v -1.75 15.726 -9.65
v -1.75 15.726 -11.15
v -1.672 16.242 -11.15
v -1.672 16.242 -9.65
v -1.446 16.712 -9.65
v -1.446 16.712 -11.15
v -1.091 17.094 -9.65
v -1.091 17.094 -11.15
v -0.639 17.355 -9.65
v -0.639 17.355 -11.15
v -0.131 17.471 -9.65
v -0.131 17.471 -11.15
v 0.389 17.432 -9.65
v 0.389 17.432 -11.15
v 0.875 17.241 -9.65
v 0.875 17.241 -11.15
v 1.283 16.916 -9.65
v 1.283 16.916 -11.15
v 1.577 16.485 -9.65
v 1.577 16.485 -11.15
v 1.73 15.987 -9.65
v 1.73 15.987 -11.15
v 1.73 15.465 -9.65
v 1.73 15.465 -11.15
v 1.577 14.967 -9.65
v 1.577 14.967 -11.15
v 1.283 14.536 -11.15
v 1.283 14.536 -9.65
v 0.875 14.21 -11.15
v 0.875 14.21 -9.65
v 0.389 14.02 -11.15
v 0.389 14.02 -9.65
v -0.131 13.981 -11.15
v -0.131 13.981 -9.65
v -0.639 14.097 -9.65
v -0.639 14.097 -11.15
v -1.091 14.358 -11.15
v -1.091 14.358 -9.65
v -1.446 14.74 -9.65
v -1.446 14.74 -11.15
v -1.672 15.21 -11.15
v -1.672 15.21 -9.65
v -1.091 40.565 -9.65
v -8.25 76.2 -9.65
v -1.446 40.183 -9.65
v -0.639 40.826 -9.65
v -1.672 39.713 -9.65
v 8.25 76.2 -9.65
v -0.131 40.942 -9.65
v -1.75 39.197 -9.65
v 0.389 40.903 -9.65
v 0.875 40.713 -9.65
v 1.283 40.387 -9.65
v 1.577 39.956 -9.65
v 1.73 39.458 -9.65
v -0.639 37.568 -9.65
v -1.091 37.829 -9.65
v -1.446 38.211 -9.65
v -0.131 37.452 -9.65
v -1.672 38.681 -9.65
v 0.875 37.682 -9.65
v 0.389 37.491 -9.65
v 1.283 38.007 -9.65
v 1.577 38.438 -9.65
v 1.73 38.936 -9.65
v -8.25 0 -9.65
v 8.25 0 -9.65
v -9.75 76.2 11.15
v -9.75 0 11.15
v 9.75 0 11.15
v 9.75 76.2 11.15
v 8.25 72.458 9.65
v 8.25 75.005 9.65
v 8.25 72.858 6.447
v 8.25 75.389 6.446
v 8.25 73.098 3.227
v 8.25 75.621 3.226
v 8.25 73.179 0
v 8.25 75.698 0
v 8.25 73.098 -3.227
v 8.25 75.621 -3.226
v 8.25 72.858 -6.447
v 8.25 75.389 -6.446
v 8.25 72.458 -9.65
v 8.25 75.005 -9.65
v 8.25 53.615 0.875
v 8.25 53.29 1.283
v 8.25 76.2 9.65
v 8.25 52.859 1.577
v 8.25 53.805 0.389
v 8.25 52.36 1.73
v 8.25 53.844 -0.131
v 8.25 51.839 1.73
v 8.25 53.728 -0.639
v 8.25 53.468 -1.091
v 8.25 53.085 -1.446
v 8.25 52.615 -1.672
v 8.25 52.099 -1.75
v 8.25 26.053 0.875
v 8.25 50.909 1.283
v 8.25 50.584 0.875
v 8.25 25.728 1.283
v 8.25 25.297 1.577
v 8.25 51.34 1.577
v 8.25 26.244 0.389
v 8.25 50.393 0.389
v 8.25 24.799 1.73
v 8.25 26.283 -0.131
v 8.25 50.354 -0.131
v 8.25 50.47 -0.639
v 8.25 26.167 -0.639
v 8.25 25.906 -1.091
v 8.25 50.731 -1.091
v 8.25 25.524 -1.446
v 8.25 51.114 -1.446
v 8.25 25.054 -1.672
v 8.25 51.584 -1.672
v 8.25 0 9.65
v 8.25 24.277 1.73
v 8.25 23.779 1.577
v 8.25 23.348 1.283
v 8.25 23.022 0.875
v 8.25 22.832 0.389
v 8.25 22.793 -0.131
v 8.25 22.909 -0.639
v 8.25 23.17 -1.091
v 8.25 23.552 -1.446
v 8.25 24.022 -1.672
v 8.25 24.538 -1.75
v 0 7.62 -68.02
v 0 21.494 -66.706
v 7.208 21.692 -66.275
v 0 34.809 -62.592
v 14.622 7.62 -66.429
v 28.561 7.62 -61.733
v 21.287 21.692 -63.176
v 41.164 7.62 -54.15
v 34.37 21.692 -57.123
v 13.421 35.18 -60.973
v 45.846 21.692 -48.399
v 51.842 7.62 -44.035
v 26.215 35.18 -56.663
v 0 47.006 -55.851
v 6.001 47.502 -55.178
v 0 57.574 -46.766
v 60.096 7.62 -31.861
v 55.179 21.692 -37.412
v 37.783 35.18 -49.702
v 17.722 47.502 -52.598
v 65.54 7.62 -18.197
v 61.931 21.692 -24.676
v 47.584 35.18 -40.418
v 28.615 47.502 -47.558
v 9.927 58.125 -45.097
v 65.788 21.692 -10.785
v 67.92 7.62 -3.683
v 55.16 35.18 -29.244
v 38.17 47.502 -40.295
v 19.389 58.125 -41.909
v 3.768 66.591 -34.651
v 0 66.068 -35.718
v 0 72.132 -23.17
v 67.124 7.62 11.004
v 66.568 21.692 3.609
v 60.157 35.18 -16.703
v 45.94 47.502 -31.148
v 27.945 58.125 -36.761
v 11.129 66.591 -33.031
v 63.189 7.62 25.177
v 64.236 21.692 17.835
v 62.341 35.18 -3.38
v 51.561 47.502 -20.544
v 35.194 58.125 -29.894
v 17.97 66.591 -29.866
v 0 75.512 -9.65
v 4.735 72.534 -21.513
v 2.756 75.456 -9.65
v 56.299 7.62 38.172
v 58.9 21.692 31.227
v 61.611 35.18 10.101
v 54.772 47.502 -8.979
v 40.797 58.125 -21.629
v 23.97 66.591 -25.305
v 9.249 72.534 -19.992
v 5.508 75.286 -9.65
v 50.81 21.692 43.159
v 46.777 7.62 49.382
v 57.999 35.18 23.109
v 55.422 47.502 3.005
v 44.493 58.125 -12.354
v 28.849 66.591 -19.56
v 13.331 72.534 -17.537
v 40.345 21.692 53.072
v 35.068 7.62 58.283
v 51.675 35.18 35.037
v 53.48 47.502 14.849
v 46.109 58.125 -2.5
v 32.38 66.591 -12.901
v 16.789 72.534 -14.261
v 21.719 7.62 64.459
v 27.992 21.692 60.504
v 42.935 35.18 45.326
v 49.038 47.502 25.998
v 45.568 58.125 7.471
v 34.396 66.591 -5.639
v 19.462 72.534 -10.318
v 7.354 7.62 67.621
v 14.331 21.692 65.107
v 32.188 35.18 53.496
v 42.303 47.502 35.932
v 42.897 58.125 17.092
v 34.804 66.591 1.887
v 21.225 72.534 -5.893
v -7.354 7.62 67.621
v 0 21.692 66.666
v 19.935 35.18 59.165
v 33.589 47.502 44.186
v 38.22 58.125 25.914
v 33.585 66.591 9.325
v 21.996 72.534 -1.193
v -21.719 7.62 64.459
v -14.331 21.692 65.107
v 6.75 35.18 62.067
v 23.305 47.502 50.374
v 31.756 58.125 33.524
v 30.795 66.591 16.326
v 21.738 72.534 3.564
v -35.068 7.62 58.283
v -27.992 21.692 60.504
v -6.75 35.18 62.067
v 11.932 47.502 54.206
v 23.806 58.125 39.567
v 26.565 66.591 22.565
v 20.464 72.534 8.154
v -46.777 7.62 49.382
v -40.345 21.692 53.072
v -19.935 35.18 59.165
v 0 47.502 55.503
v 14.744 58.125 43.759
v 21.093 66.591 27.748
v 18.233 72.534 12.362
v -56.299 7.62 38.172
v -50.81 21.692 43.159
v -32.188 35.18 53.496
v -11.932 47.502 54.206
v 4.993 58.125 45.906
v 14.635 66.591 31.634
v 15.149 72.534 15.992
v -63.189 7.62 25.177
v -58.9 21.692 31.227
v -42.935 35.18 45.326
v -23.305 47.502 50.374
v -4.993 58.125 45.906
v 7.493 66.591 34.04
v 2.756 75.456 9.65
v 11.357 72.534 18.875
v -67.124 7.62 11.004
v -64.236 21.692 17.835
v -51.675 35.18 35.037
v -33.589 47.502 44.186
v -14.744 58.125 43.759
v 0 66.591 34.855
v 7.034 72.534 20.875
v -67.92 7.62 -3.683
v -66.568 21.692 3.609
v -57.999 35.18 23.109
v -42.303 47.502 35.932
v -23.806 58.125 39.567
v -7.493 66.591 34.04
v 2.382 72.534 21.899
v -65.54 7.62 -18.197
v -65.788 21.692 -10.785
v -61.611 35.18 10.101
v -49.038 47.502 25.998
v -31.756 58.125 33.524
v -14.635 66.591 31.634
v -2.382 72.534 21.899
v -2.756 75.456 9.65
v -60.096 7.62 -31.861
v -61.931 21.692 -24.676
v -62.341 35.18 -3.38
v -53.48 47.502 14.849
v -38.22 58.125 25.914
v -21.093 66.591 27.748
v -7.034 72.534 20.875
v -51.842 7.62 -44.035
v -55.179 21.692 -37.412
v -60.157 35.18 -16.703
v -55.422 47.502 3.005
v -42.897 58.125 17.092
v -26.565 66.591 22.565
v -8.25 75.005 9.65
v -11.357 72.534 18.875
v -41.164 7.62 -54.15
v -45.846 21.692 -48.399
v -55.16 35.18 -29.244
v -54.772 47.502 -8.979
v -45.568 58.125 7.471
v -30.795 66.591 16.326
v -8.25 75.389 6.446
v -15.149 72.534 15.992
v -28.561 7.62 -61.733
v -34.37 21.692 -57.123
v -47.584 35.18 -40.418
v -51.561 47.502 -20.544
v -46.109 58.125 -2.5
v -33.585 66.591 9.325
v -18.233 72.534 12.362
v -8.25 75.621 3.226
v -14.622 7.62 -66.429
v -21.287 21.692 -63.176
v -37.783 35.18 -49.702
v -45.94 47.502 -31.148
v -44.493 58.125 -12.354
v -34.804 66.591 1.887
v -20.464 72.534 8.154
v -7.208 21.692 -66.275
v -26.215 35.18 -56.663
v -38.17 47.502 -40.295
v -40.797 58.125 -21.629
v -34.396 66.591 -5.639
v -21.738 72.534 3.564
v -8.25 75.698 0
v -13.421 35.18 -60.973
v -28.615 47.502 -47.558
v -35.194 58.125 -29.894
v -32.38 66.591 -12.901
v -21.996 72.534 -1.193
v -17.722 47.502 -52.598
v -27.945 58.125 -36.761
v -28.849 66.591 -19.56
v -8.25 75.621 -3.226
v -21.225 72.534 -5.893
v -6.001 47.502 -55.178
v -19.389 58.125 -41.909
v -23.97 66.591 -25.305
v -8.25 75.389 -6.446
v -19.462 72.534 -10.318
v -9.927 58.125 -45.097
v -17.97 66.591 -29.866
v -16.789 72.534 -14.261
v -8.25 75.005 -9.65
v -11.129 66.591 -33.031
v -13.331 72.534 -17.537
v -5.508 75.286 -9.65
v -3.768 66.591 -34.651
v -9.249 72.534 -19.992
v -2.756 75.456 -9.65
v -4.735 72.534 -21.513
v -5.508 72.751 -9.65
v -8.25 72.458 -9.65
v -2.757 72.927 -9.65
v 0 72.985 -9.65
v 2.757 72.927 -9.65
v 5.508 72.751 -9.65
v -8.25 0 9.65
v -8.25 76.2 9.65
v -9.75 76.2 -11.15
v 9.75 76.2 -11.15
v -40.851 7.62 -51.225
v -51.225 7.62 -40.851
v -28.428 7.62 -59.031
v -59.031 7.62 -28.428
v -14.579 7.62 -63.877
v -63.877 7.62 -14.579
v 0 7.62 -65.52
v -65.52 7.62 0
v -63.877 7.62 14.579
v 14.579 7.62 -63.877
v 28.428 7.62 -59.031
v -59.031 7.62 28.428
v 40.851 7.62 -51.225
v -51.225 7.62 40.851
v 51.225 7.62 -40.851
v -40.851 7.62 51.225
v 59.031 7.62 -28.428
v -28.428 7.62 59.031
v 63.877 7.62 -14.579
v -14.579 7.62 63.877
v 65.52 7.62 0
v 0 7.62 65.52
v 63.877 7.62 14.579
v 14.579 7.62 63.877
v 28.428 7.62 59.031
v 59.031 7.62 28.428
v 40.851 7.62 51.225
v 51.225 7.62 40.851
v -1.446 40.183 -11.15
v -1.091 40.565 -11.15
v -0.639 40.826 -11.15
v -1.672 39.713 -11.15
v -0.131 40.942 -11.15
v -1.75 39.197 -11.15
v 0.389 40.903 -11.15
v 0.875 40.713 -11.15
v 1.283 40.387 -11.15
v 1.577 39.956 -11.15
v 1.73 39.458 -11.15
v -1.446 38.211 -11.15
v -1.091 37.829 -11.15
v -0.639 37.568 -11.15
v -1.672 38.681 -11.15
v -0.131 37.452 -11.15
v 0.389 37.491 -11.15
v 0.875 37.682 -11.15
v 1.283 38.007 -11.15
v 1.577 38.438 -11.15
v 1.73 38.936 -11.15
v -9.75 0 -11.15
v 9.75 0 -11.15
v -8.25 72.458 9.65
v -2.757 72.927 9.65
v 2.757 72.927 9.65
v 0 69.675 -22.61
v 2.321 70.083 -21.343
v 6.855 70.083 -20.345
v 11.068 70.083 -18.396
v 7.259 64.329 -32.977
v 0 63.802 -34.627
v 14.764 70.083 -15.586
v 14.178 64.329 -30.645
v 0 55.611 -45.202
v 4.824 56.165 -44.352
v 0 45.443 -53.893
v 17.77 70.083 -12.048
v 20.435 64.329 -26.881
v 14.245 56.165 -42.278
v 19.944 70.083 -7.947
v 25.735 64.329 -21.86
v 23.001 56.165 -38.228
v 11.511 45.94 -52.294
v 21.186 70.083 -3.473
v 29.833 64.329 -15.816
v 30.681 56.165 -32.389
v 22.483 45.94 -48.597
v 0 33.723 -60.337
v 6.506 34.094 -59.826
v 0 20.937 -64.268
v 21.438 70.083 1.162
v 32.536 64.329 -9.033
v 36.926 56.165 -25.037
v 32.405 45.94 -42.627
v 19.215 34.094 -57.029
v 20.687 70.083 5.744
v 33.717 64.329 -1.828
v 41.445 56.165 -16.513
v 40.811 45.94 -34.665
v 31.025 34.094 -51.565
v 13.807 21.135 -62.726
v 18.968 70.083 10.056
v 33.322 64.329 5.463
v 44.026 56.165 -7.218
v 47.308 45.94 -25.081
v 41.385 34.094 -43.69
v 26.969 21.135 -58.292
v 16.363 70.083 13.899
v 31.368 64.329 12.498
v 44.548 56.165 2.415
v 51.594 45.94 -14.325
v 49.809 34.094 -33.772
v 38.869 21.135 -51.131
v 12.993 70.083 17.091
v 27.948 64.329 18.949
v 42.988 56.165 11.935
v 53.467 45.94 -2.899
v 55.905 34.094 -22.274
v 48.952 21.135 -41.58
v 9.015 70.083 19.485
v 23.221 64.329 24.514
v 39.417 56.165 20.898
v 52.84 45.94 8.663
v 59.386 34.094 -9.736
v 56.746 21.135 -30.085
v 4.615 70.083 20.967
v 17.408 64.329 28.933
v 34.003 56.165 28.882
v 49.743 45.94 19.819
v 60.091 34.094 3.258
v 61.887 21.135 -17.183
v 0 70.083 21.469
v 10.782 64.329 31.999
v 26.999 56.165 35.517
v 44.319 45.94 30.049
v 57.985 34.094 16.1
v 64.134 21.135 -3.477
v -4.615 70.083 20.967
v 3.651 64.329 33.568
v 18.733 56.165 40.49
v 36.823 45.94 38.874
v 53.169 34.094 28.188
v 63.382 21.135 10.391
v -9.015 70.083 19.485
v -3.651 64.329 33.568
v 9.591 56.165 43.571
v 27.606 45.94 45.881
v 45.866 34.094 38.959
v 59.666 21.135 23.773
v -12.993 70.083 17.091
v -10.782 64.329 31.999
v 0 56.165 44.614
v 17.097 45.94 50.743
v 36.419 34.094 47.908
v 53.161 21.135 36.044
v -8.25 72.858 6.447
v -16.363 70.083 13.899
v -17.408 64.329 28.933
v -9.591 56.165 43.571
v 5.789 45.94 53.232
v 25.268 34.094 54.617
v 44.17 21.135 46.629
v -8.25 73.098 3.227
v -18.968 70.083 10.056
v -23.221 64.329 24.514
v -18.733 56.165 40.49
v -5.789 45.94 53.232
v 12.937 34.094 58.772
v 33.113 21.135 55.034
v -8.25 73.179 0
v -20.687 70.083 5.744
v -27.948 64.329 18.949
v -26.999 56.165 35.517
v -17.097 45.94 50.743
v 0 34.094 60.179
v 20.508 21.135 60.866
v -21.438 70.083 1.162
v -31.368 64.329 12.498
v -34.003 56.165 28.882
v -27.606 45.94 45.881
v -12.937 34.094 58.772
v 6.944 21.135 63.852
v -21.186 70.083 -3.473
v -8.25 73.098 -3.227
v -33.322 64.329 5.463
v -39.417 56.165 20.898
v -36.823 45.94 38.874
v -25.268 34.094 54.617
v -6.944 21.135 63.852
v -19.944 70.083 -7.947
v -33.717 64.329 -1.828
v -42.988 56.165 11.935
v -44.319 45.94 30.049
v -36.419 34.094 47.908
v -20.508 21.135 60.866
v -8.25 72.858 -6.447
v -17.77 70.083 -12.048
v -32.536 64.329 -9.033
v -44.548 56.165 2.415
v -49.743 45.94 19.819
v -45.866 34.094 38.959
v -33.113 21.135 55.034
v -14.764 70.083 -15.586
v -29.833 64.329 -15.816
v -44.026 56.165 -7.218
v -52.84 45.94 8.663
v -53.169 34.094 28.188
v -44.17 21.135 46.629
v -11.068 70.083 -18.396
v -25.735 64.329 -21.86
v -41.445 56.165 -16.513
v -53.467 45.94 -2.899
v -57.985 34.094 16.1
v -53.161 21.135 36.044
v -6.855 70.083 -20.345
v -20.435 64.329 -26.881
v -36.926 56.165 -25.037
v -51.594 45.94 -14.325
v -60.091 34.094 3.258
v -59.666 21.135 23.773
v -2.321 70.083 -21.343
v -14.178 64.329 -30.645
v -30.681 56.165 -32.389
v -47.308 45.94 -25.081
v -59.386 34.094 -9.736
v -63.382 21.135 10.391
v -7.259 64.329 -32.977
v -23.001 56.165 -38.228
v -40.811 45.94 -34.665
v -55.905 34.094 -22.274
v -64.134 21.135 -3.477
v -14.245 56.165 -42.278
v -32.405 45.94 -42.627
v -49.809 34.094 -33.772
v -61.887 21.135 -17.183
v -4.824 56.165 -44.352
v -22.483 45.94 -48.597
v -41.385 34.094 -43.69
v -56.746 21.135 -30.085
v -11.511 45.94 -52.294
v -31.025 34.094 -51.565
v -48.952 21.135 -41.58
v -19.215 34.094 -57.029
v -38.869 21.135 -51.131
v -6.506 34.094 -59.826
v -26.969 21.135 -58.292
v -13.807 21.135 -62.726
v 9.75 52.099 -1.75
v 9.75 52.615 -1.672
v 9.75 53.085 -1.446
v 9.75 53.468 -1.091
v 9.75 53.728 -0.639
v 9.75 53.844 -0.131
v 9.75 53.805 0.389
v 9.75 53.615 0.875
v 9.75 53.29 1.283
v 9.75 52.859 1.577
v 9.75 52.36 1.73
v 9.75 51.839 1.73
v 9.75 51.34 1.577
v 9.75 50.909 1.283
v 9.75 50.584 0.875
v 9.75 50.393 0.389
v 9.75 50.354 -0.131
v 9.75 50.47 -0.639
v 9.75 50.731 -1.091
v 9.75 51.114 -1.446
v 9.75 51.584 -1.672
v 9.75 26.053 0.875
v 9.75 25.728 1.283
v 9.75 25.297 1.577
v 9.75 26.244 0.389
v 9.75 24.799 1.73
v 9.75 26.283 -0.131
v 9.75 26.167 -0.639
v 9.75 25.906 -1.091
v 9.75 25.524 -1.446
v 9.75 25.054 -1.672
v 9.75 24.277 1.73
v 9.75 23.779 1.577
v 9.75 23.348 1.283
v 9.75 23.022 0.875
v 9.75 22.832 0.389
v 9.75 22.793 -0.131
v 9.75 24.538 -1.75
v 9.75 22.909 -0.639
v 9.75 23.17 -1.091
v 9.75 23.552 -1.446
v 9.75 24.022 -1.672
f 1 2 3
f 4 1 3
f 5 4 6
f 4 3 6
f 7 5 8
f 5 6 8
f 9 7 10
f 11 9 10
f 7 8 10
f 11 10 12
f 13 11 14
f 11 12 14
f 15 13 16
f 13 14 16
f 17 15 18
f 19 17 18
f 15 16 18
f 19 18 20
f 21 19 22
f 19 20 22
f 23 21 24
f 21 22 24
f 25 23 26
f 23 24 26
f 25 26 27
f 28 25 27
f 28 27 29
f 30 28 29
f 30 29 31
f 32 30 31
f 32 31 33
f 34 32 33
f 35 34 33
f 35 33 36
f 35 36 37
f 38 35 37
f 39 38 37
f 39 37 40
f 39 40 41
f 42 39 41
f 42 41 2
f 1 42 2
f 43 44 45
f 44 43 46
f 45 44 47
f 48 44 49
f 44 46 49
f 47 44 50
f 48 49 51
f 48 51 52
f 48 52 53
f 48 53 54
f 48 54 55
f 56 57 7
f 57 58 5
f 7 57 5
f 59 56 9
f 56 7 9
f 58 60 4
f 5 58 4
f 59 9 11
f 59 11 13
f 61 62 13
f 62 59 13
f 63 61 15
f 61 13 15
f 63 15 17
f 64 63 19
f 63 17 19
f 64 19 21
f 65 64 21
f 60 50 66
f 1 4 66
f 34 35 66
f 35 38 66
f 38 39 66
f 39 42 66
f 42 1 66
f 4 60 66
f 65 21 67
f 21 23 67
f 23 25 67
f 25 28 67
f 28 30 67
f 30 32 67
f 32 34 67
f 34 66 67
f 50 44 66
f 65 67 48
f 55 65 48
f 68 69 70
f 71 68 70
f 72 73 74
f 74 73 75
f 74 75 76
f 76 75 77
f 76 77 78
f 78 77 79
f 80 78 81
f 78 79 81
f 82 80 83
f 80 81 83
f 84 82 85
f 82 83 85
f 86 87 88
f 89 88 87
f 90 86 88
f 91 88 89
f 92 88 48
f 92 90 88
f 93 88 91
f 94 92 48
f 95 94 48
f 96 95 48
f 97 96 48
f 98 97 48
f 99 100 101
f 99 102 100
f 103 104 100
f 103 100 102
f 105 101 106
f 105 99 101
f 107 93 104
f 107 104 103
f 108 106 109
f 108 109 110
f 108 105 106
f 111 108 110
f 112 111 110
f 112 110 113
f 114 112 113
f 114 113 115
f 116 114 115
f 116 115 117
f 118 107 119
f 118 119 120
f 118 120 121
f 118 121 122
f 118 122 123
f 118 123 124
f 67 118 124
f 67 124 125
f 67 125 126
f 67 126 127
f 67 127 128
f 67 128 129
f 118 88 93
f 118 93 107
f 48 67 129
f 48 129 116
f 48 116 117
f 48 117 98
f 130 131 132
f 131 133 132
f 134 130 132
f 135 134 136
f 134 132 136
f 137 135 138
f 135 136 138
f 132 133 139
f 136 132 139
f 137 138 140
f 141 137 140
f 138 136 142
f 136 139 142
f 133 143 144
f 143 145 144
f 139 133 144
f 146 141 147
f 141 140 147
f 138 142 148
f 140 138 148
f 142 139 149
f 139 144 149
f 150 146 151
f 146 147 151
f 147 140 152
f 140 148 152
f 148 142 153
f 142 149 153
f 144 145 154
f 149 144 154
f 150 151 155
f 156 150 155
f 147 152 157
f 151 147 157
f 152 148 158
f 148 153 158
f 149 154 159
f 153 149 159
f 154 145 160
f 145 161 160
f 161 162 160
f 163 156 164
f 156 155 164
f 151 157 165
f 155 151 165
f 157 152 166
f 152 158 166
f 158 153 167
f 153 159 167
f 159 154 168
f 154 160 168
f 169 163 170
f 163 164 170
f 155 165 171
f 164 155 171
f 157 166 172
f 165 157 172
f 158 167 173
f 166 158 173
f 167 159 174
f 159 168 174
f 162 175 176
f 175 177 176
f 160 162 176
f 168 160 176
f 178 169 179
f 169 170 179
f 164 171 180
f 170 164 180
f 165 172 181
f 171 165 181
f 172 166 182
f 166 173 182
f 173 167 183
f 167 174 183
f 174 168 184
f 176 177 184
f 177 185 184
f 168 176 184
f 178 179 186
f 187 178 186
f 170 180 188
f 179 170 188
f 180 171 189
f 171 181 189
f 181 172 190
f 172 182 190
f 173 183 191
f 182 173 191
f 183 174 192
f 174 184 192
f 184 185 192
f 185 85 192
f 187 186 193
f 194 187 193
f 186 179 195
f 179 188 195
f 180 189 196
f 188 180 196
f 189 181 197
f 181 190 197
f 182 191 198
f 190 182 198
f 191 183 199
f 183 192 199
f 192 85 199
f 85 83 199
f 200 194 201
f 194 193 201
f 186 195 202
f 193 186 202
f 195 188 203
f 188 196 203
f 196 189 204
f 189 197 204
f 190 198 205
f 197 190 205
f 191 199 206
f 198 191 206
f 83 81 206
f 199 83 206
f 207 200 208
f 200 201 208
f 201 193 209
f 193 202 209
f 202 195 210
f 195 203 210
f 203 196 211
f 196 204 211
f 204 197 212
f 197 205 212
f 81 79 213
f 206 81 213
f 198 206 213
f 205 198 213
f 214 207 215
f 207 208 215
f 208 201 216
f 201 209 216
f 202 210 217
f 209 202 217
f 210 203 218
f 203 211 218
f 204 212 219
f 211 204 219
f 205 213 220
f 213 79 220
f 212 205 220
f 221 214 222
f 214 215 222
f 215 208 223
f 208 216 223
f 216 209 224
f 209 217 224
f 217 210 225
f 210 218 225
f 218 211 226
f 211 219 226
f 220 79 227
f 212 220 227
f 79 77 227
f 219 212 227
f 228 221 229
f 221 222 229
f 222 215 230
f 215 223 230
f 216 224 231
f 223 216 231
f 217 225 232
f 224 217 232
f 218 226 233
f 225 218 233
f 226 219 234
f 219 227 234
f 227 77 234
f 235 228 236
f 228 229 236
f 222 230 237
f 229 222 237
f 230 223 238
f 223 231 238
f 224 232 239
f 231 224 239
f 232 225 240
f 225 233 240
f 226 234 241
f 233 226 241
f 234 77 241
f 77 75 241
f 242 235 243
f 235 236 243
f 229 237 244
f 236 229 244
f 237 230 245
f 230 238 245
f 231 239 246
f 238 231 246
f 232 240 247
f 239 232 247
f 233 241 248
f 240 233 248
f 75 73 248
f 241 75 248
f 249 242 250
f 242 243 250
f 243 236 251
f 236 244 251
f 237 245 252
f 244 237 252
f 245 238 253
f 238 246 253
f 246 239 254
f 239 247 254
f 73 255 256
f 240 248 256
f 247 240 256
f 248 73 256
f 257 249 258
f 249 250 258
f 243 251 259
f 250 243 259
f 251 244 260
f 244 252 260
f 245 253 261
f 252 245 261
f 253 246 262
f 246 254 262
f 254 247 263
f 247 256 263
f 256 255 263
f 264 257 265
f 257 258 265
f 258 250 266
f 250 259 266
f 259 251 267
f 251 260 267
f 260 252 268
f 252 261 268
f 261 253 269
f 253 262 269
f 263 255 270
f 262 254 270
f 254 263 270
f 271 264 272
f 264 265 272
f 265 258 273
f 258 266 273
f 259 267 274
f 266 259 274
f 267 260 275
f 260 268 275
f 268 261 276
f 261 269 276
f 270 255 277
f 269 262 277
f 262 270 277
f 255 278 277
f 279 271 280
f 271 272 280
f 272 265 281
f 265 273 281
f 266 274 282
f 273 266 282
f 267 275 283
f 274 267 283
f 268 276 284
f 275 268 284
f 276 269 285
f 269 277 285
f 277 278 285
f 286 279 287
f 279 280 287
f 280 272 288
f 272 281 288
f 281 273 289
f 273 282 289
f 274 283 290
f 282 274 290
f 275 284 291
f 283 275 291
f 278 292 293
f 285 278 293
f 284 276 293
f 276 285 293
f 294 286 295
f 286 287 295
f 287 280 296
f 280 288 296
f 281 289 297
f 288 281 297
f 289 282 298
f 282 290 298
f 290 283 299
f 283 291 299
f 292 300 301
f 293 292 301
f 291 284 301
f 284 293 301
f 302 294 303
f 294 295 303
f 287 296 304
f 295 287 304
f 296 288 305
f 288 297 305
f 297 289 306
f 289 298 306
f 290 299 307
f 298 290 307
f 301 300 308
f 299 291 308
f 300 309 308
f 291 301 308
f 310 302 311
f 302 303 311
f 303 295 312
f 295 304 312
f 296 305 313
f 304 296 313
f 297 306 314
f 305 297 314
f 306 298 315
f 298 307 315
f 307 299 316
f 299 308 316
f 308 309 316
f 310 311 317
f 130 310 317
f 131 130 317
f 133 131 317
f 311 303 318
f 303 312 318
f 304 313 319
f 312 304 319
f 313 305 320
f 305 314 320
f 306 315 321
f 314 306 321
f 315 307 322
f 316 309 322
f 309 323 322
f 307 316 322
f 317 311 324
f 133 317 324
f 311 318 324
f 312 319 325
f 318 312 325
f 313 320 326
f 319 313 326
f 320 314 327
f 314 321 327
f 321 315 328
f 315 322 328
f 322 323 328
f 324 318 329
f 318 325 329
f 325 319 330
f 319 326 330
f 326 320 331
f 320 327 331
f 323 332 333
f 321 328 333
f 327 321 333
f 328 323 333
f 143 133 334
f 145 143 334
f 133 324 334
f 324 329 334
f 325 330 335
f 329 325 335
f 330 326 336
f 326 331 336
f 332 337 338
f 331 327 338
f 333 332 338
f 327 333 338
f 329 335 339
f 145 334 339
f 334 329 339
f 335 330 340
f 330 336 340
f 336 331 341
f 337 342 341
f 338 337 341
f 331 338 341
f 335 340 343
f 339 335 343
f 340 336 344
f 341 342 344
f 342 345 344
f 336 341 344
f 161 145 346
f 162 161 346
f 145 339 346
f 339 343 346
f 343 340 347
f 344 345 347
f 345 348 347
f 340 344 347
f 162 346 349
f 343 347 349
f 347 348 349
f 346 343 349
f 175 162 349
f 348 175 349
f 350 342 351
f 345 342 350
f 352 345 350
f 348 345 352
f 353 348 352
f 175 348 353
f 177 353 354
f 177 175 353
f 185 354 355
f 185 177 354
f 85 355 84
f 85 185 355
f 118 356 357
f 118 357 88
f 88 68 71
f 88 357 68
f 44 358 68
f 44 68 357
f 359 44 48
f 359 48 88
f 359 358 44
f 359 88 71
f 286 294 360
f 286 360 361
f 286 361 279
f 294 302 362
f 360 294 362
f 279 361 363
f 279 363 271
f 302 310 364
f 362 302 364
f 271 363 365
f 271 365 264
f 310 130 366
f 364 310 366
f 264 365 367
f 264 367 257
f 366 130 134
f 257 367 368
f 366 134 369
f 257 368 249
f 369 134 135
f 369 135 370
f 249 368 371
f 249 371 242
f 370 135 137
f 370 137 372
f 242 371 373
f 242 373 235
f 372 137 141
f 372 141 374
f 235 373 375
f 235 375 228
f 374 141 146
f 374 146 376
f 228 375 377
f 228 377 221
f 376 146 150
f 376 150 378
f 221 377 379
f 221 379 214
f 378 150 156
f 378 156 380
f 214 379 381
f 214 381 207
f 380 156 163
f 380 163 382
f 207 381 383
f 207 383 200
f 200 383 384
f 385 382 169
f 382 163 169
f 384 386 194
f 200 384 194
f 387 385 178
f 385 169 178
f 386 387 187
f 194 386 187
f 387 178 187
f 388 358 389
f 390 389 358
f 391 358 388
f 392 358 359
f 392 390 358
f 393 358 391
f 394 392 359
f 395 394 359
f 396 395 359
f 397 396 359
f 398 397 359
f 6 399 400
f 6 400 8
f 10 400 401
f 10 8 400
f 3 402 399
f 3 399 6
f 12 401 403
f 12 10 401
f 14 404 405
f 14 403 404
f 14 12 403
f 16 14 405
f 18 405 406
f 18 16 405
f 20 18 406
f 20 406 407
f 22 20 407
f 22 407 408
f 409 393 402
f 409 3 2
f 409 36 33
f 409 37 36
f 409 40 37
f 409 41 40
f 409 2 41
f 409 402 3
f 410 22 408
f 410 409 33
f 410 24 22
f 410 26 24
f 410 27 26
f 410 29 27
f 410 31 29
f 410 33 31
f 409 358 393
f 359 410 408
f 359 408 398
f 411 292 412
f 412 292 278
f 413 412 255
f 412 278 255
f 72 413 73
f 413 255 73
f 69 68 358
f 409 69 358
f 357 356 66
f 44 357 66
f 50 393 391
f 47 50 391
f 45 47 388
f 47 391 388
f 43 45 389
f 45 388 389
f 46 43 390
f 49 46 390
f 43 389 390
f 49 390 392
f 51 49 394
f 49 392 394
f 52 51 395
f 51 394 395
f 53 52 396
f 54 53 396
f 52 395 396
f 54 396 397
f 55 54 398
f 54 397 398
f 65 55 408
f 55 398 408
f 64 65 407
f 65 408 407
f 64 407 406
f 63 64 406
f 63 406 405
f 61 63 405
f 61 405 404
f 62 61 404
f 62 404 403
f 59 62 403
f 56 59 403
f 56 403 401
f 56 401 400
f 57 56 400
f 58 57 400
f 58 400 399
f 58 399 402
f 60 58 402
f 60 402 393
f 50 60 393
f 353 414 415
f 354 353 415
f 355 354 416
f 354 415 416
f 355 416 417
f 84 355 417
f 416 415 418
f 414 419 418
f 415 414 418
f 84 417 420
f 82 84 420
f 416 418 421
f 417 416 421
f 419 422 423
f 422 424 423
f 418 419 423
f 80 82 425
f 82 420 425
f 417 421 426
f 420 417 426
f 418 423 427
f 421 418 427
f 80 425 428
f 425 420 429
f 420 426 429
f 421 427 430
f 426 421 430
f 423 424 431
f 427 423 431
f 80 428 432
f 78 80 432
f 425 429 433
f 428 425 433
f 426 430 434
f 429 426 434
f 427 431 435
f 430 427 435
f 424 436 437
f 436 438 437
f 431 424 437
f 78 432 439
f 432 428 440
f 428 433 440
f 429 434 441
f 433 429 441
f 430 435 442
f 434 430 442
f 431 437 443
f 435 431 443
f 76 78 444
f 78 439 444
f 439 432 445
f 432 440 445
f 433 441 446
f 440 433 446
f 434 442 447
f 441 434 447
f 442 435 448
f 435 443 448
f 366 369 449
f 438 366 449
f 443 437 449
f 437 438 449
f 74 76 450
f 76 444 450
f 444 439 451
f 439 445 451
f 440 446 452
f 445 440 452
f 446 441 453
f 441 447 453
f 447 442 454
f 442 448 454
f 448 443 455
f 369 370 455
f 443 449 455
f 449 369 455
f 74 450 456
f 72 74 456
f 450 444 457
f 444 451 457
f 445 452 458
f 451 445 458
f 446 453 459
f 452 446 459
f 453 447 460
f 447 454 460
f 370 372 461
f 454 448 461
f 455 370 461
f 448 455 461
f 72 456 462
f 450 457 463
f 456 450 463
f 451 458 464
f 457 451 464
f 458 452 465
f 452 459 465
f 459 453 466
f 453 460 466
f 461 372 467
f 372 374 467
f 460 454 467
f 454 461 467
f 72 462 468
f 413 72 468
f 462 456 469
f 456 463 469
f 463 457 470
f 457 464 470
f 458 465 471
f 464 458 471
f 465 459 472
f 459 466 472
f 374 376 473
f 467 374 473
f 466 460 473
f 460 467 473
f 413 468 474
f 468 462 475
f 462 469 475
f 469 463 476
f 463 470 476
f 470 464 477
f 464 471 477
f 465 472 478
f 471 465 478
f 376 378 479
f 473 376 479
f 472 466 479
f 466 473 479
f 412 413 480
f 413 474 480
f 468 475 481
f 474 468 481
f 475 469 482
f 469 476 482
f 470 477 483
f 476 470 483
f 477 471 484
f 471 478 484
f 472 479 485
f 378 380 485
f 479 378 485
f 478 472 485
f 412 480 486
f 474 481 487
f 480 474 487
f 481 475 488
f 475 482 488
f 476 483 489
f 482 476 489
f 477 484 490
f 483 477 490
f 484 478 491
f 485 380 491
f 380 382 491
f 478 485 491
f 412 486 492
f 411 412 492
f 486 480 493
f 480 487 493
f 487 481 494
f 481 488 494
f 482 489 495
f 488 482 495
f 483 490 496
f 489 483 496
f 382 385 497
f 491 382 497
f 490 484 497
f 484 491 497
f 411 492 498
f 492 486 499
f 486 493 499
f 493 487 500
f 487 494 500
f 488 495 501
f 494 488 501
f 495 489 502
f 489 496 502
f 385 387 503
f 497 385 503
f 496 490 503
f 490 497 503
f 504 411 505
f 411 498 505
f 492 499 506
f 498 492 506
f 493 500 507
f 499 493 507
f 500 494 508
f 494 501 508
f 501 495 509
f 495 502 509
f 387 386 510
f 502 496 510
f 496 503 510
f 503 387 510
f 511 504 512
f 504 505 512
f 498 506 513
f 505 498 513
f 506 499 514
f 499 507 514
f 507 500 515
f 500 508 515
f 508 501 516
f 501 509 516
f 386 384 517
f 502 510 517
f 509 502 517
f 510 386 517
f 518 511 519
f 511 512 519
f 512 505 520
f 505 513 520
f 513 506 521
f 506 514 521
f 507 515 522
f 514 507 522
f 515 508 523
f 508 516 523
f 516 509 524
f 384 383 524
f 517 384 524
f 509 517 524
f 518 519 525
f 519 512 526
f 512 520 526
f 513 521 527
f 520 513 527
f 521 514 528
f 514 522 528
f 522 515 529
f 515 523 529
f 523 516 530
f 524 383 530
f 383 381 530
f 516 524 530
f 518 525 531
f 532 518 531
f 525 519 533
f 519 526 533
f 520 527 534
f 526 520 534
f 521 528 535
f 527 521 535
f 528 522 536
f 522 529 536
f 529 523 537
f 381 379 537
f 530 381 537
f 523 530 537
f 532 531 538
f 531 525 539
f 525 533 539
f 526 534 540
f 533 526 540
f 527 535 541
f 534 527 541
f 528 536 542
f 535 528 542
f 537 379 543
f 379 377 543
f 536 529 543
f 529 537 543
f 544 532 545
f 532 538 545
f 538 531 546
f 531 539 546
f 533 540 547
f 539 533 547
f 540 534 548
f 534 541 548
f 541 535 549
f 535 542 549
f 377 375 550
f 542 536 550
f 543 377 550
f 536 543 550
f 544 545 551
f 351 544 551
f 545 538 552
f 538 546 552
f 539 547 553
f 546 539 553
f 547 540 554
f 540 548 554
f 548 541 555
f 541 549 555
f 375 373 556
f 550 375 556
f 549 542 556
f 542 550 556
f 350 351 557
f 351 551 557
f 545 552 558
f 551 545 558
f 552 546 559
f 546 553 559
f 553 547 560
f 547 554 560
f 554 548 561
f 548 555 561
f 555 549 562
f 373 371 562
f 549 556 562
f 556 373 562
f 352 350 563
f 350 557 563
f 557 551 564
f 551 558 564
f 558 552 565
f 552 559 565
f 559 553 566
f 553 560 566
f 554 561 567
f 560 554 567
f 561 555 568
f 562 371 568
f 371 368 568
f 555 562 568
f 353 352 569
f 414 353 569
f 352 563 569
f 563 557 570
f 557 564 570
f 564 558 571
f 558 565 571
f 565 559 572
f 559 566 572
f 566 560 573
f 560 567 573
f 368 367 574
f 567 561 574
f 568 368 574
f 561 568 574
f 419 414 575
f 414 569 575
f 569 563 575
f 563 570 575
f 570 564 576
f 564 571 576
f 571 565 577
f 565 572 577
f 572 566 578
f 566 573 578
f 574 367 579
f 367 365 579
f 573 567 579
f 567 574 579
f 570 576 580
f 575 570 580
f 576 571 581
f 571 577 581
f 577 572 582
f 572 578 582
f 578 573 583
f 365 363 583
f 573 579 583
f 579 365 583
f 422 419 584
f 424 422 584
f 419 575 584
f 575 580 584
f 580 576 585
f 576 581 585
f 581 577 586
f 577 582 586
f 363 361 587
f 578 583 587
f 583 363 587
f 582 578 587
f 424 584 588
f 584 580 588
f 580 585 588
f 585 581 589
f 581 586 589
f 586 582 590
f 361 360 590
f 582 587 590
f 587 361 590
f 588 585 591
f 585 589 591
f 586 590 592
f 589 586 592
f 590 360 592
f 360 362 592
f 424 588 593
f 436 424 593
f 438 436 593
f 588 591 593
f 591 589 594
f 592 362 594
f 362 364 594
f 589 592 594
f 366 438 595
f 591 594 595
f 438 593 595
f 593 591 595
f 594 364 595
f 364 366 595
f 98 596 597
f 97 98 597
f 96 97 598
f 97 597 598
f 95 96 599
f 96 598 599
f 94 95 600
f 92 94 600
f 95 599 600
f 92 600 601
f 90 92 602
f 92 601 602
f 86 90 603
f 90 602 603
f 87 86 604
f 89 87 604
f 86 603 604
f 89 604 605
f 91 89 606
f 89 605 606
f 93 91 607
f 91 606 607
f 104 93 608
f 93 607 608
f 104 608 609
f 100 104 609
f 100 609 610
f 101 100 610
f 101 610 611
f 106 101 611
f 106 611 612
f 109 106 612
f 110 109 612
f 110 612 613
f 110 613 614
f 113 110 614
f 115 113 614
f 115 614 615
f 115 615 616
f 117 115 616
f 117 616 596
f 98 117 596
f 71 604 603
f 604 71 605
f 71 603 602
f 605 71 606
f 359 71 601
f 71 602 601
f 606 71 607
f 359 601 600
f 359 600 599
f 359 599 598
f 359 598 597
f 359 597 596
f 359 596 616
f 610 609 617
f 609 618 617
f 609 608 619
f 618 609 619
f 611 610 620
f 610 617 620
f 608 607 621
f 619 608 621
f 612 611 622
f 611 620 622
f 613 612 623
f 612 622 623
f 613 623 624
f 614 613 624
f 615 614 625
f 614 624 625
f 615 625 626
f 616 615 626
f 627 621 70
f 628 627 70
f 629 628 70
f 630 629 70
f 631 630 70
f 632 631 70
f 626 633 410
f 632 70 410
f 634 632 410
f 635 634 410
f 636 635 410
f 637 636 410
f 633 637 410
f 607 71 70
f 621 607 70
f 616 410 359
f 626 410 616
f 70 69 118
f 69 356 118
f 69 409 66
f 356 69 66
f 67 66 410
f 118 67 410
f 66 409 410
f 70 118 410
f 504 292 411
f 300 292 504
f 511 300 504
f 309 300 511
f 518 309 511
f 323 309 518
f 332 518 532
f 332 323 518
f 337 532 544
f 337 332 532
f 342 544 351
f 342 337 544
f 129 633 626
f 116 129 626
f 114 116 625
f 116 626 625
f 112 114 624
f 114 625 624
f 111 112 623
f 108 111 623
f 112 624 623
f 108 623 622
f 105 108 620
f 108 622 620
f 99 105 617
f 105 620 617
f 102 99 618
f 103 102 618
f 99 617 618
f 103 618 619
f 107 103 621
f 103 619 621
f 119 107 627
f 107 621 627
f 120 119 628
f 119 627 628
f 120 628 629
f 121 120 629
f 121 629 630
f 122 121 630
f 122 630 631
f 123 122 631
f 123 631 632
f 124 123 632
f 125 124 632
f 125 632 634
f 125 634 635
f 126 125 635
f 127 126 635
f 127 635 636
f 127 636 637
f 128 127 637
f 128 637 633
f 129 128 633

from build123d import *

# Parameters (mm, degrees)
SKETCH1_W           = 19.5
SKETCH1_H           = 22.3
SKETCH1_W_2         = 16.5
SKETCH1_H_2         = 19.3
BOSS_EXTRUDE1_DEPTH = 76.2
SKETCH3_W           = 16.5
SKETCH3_H           = 19.3
CUT_EXTRUDE1_DEPTH  = 25.4
SKETCH4_R           = 1.75
CUT_EXTRUDE2_DEPTH  = 12.7
SKETCH5_R           = 1.75
CUT_EXTRUDE3_DEPTH  = 12.7


with BuildPart() as part:
    # Sketch1 → Boss-Extrude1 (new body)
    with BuildSketch(Plane(origin=(0, 0, 0), x_dir=(1, 0, 0), z_dir=(0, 1, 0))):
        Rectangle(SKETCH1_W, SKETCH1_H)
        Rectangle(SKETCH1_W_2, SKETCH1_H_2, mode=Mode.SUBTRACT)
    extrude(amount=BOSS_EXTRUDE1_DEPTH)

    # Sketch4 → Cut-Extrude2 (cut)
    with BuildSketch(Plane(origin=(9.75, 0, 0), x_dir=(0, 0, -1), z_dir=(1, 0, 0))):
        with Locations((0, 24.537862789)):
            Circle(SKETCH4_R)
        with Locations((0, 52.099354453)):
            Circle(SKETCH4_R)
    extrude(amount=-CUT_EXTRUDE2_DEPTH, mode=Mode.SUBTRACT)

    # Sketch5 → Cut-Extrude3 (cut)
    with BuildSketch(Plane(origin=(0, 0, -11.15), x_dir=(-1, 0, 0), z_dir=(0, 0, -1))):
        with Locations((0, 15.725827397)):
            Circle(SKETCH5_R)
        with Locations((0, 39.197129193)):
            Circle(SKETCH5_R)
    extrude(amount=-CUT_EXTRUDE3_DEPTH, mode=Mode.SUBTRACT)


with BuildPart() as body_2:
    # Sketch2 → Revolve1 (revolve)
    with BuildSketch(Plane.ZY):
        with BuildLine():
            Line((-65.519554277, 7.62), (-68.019641629, 7.62))
            ThreePointArc((-68.019641629, 7.62), (-48.295672806, 56.07912413), (0, 76.2))
            Line((0, 76.2), (0, 73.7))
            ThreePointArc((0, 73.7), (-46.527890541, 54.311341606), (-65.519554277, 7.62))
        make_face()
    revolve(axis=Axis((0, 7.62, 0), (0, -1, 0)))

    # Sketch3 → Cut-Extrude1 (cut)
    with BuildSketch(Plane(origin=(0, 76.2, 0), x_dir=(1, 0, 0), z_dir=(0, 1, 0))):
        Rectangle(SKETCH3_W, SKETCH3_H)
    extrude(amount=-CUT_EXTRUDE1_DEPTH, mode=Mode.SUBTRACT)


solid = Compound([part.part, body_2.part])
